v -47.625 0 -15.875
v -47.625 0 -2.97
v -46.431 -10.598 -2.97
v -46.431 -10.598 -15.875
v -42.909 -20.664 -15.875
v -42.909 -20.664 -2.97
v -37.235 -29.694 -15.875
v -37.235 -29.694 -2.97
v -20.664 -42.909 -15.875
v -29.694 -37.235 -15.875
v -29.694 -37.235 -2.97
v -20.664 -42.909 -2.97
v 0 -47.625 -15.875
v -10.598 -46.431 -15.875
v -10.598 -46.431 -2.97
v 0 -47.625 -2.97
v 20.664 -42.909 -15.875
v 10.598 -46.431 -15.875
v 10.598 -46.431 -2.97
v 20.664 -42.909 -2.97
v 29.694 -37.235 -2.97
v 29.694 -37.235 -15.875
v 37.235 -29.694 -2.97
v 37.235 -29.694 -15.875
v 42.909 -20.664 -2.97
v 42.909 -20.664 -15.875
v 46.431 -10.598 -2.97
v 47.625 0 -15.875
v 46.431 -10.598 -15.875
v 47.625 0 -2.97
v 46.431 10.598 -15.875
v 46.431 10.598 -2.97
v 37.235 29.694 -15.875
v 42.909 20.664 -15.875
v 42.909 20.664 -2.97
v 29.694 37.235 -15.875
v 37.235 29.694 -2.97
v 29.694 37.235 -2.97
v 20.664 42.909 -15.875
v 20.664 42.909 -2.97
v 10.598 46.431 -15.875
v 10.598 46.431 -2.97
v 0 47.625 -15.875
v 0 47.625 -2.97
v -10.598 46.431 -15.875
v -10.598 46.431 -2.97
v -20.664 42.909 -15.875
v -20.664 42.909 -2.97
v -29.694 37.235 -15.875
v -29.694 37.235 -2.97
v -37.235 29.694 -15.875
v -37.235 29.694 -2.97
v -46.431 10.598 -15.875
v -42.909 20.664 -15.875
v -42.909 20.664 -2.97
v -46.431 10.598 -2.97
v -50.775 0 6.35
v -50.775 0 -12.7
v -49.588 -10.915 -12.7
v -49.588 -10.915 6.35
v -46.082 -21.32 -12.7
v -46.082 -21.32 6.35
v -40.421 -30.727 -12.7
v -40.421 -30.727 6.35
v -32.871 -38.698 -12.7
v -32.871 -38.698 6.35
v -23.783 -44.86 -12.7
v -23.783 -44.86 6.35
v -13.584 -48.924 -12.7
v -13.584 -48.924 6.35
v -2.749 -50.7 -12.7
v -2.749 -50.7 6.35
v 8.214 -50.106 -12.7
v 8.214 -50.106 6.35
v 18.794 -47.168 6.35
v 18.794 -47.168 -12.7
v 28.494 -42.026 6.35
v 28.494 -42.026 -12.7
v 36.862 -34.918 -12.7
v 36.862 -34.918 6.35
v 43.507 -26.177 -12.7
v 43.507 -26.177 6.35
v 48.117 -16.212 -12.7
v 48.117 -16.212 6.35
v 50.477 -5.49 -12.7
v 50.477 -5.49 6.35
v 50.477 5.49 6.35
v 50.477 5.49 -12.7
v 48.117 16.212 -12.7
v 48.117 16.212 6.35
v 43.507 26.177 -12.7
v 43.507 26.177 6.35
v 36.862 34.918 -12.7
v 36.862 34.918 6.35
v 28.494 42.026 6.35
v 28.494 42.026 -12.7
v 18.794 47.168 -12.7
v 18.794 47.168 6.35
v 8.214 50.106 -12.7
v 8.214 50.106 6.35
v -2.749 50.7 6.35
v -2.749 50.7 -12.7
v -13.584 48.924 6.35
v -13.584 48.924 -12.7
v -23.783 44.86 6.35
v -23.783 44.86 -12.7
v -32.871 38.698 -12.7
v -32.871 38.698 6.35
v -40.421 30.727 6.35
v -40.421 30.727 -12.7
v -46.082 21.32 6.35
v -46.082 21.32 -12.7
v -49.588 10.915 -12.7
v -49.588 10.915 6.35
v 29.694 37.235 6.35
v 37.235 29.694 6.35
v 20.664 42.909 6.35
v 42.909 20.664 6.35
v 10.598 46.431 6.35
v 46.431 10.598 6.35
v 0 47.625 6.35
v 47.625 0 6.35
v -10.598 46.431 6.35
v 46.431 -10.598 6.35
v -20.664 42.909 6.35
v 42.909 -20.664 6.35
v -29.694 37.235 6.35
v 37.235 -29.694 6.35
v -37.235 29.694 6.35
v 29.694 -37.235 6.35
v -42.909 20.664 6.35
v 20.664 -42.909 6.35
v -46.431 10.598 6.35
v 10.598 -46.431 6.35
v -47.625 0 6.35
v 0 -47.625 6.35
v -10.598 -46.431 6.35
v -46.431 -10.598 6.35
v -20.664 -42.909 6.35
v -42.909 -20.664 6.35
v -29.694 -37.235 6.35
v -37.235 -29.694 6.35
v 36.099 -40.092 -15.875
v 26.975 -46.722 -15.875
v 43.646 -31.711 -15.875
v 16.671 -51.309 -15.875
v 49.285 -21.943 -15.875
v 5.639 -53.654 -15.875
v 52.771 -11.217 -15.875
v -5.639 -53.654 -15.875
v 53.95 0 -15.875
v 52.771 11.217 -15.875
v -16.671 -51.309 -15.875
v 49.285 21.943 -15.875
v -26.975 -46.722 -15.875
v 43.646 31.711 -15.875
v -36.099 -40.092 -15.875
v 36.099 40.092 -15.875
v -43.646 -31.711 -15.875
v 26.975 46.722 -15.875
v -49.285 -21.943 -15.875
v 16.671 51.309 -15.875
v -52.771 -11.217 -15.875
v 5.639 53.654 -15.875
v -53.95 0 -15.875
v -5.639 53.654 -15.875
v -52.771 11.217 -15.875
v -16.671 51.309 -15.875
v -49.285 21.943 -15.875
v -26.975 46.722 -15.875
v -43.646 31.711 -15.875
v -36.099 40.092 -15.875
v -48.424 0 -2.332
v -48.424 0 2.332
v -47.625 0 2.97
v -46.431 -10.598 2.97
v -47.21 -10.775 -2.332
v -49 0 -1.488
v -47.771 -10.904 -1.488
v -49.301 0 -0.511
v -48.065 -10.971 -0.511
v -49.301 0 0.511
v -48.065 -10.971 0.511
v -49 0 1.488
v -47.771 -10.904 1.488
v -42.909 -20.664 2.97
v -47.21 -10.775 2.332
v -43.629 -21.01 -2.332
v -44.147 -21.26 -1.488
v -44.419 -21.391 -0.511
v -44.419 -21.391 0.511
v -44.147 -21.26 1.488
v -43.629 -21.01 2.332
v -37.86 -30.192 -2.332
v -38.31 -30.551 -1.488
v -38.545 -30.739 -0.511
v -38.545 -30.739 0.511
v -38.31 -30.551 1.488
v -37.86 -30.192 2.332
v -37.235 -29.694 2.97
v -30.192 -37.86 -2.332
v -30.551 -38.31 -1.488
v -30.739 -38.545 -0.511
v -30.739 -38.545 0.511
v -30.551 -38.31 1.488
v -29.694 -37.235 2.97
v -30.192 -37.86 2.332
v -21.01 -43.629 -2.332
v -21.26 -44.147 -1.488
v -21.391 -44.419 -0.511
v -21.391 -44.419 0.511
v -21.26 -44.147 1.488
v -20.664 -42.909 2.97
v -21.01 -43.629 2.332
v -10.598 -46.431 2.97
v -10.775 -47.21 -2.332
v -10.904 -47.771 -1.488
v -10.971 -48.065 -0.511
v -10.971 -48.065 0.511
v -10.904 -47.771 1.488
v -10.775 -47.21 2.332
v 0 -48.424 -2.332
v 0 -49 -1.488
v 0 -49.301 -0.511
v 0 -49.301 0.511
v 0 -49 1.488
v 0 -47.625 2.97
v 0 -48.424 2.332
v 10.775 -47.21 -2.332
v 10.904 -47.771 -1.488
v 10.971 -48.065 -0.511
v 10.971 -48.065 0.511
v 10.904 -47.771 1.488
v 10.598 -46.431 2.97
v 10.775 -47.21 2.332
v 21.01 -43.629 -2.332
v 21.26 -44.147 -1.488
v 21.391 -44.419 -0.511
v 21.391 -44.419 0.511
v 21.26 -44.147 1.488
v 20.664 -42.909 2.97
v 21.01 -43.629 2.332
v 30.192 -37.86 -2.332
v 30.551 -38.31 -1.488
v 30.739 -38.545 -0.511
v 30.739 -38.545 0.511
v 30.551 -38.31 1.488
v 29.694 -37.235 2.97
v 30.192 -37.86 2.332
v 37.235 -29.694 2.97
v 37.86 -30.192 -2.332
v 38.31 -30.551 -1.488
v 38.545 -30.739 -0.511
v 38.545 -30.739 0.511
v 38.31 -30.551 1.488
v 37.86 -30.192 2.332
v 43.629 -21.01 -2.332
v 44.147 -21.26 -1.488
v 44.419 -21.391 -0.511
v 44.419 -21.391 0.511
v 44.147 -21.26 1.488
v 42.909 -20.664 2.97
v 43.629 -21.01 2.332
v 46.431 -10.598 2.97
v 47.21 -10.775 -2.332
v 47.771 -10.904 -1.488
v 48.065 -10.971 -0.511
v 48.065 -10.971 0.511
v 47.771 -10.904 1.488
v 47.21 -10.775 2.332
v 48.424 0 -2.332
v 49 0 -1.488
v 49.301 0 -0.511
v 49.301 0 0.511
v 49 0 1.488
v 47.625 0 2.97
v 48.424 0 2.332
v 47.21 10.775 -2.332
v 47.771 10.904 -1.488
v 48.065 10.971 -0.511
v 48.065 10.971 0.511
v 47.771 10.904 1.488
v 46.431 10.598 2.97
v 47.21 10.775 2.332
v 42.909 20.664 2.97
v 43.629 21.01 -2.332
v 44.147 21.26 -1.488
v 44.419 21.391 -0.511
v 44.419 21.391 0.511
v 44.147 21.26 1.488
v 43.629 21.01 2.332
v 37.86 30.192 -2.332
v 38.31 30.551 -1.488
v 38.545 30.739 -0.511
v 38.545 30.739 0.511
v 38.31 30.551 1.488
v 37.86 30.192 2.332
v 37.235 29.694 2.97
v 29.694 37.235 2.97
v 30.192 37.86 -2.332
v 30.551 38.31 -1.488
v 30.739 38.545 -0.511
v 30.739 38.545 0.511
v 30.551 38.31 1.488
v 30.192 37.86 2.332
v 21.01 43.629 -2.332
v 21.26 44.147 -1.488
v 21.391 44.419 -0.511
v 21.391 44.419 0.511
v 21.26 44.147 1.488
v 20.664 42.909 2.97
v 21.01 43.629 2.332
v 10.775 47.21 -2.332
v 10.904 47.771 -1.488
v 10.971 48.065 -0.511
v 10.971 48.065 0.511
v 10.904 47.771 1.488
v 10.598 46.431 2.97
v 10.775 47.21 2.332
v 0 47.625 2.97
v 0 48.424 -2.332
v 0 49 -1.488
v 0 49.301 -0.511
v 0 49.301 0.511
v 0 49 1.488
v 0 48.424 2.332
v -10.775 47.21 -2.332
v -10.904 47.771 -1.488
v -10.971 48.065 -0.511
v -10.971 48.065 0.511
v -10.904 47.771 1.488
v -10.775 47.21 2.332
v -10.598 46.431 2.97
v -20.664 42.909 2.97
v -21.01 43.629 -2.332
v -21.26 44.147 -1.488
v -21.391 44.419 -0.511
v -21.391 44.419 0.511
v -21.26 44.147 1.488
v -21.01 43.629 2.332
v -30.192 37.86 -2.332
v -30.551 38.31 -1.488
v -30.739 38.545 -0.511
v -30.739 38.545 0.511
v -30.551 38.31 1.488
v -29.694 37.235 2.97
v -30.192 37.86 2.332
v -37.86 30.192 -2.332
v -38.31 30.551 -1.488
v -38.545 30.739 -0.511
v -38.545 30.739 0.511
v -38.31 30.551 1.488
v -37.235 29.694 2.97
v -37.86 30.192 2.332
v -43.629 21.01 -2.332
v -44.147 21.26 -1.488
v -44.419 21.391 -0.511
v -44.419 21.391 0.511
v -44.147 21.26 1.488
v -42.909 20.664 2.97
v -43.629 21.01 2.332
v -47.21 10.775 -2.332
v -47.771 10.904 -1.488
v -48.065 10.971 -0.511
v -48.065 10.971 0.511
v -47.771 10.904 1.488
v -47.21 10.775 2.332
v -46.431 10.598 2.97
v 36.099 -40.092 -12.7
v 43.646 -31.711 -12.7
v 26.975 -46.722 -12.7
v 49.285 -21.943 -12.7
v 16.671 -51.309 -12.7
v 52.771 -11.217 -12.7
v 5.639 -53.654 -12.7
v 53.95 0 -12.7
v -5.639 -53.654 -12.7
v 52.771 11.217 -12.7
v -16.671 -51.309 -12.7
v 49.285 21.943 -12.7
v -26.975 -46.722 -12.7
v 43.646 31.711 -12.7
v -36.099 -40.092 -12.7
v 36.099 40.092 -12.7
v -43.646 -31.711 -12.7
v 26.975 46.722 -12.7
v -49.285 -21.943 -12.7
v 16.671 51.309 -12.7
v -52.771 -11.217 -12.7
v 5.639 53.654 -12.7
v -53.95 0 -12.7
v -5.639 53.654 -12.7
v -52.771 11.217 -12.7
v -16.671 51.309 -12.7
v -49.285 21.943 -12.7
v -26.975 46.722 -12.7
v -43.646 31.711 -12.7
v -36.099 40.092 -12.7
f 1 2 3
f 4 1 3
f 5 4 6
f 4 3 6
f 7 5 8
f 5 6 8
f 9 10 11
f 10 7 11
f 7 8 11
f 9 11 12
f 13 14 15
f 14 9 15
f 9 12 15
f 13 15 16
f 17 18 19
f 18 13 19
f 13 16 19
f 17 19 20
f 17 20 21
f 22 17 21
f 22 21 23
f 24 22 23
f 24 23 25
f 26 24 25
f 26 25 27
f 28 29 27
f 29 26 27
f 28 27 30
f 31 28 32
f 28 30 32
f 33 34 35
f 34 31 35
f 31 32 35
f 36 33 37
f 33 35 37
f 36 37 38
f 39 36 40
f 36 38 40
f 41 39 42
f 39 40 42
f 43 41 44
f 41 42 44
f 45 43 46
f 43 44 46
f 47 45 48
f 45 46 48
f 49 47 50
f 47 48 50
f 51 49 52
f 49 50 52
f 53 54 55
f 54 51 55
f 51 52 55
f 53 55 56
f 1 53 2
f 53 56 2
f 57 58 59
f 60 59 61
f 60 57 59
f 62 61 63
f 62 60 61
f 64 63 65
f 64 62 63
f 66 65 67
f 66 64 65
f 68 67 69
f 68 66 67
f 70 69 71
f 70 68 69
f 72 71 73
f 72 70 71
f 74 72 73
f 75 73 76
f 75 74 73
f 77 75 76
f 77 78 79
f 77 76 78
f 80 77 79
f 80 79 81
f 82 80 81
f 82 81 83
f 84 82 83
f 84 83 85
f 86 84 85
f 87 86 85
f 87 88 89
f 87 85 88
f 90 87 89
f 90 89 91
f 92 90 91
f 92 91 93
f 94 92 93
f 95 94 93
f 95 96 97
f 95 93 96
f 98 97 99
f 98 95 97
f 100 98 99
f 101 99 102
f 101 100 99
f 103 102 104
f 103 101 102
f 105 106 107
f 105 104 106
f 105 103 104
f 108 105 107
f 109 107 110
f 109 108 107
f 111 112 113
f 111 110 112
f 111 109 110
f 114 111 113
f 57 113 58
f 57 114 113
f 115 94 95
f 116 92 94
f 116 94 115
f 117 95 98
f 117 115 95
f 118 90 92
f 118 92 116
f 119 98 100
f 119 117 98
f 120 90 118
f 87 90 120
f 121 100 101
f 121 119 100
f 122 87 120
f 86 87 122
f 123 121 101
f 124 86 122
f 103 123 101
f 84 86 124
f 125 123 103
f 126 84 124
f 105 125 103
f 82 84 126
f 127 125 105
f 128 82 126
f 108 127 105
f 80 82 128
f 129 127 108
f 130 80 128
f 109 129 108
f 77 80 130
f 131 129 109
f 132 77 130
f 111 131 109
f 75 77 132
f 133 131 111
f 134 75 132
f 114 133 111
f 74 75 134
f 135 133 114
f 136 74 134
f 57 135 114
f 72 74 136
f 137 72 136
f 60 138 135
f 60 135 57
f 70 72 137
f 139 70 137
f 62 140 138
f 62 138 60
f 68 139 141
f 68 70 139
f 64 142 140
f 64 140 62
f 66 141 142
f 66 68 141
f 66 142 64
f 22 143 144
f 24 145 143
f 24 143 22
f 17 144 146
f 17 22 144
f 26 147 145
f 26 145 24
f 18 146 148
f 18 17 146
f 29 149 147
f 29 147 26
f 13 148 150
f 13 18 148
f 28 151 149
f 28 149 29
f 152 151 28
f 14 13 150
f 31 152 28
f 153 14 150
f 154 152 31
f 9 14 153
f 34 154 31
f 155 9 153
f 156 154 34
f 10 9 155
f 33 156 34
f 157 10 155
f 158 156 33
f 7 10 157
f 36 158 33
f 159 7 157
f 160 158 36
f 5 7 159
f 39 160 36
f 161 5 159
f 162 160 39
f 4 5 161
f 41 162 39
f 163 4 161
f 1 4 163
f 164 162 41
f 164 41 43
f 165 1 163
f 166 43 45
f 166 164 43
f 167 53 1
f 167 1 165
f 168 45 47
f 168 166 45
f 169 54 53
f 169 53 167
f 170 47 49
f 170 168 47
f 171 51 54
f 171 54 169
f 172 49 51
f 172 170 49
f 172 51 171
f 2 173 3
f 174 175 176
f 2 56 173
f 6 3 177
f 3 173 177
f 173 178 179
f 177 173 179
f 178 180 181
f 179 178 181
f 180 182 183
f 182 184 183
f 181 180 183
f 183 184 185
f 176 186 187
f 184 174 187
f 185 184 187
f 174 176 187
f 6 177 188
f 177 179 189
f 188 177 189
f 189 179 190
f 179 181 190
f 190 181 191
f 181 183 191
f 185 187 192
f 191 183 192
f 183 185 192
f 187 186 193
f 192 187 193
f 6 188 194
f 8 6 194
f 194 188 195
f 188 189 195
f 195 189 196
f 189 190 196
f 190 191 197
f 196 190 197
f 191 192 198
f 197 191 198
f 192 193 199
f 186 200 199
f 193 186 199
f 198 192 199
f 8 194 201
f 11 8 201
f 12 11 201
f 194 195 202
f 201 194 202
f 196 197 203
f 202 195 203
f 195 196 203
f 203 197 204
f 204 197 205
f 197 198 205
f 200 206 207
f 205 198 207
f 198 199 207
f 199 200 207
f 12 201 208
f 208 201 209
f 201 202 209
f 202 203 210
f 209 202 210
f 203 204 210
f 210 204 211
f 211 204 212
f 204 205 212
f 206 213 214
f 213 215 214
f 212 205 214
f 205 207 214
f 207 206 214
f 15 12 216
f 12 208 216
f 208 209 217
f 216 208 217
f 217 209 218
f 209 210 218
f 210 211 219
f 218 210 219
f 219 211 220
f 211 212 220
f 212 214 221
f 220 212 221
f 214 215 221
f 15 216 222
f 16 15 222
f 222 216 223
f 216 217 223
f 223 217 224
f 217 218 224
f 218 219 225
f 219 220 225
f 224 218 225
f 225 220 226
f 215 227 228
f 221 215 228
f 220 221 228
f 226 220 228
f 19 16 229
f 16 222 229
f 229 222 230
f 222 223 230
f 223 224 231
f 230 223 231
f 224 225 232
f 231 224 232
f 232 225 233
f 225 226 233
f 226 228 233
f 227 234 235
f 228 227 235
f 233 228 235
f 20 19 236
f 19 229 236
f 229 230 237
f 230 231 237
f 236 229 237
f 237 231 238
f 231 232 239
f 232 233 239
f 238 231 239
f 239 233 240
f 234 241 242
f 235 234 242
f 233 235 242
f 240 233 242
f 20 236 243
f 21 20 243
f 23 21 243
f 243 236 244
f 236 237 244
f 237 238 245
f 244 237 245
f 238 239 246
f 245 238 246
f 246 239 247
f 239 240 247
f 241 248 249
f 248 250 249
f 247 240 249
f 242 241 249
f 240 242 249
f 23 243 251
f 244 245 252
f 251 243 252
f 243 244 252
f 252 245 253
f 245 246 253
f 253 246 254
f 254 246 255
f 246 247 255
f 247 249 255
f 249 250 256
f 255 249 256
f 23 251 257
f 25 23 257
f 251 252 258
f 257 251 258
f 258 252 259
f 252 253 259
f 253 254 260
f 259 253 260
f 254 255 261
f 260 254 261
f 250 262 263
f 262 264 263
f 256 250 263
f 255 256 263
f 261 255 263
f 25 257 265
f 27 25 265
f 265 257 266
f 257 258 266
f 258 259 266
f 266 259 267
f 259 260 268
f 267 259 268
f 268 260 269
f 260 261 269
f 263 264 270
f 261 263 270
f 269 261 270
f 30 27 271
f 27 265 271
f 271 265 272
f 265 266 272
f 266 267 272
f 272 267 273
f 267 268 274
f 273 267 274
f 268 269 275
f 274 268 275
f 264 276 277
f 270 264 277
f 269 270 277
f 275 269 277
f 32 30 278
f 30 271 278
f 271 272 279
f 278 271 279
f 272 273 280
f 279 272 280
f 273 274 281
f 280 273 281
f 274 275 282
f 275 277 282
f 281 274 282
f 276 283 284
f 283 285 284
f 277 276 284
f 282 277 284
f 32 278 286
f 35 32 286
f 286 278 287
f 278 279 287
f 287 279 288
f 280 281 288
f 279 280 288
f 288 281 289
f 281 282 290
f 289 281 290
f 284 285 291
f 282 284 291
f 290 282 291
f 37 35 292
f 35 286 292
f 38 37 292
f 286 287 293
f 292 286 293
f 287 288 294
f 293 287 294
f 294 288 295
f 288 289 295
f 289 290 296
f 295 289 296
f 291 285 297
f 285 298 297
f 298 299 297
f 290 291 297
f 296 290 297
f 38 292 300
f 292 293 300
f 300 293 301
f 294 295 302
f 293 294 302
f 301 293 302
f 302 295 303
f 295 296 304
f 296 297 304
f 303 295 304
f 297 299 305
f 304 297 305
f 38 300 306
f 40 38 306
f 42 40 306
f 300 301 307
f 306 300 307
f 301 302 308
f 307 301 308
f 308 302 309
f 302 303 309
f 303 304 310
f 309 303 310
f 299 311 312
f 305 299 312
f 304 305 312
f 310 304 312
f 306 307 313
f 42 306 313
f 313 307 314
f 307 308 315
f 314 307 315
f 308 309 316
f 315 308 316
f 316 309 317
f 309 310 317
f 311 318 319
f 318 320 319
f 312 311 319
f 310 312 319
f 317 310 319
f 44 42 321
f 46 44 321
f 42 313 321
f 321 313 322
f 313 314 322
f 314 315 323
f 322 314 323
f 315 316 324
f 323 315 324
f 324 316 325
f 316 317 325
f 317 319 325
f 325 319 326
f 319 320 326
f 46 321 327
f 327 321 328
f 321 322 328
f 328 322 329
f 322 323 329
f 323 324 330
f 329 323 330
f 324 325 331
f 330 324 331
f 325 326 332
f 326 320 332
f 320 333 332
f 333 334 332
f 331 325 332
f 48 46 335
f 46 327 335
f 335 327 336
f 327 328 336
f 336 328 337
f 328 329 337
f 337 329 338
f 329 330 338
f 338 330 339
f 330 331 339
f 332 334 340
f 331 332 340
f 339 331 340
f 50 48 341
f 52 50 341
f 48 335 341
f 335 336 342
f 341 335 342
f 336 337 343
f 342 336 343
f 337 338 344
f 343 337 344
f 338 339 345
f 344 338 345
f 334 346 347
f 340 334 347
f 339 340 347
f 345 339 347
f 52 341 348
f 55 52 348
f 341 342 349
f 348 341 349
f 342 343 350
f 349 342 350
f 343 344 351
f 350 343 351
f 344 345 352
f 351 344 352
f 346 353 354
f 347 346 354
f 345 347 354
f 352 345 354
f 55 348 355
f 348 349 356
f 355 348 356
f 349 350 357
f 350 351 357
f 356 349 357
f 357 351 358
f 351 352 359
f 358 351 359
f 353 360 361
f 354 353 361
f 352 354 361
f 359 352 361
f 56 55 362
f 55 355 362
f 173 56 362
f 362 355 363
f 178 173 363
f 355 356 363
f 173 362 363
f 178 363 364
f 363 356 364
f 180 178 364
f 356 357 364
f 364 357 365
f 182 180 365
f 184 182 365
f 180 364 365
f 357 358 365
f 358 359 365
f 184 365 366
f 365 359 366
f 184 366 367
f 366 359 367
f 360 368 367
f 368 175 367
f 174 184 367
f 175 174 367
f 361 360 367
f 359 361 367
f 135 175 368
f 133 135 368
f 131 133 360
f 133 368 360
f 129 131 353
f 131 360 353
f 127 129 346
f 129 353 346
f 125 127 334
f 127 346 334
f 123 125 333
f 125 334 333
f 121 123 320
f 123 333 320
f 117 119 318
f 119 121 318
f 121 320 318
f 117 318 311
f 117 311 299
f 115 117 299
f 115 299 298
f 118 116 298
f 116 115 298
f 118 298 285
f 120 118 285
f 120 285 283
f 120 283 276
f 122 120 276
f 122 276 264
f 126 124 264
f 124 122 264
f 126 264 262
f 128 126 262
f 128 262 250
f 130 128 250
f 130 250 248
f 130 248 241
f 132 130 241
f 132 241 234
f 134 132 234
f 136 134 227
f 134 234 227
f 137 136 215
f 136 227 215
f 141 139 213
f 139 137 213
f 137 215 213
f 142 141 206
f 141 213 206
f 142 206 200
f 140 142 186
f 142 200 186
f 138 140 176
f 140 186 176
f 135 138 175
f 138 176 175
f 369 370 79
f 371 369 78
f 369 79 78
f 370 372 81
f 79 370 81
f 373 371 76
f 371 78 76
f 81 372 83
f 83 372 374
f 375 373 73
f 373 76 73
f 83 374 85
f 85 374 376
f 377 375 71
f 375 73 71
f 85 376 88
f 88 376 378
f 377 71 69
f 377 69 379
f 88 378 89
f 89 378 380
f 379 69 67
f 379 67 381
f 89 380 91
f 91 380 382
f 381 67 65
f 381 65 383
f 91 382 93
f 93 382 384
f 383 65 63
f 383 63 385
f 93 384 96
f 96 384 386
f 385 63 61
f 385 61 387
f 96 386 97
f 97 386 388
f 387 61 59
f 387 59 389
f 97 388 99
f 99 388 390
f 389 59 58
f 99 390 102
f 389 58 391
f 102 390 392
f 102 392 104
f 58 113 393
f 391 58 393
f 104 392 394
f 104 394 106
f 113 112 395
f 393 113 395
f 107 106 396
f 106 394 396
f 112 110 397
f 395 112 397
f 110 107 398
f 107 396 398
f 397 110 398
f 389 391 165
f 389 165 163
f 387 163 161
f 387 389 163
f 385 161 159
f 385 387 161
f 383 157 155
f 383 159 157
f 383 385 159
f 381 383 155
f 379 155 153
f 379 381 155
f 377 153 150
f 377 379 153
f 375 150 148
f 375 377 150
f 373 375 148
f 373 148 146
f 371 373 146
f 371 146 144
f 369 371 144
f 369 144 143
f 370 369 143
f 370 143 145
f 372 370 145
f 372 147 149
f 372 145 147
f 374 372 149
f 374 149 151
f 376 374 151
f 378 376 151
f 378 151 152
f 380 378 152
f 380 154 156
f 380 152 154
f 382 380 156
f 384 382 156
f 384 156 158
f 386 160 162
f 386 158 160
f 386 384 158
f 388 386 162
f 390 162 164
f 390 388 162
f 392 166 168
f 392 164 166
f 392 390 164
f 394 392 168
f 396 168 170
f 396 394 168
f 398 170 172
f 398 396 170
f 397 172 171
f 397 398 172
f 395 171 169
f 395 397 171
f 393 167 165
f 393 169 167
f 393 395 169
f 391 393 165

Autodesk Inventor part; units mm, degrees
ref_plane "YZ Plane" through (0, 0, 0) normal (1, 0, 0) x (0, 1, 0)
ref_plane "XZ Plane" through (0, 0, 0) normal (0, 1, 0) x (-1, 0, 0)
ref_plane "XY Plane" through (0, 0, 0) normal (0, 0, 1) x (1, 0, 0)
sketch "Sketch1" plane through (0, 0, 0) normal (0, 1, 0) x (-1, 0, 0)
  line L0 (50.7746, 6.35) -> (47.625, 6.35)
  line L1 (47.625, 6.35) -> (47.625, -6.35)
  line L2 (47.625, -6.35) -> (50.7746, -6.35)
  line L3 (50.7746, -6.35) -> (50.7746, 6.35)
  arc A0 (47.625, -2.9696) -> (47.625, 2.9696) centre (45.9105, 0) ccw
  line L4 (0, -8.89) -> (0, 8.89) projected
  point P0 (0, 0)
  point P1 (50.7746, 0)
  dimension "d1" = 47.625
  dimension "d2" = 3.1496
  dimension "d3" = 6.35
  dimension "d4" = 6.35
  dimension "d5" = 1.7145
  dimension "d6" = 3.429
revolve "Revolution1" add sketch "Sketch1" angle 360 about axis through (0, 0, -10) along (0, 0, 1) contours L3 L2 L1 A0 L0
sketch "Sketch2" plane through (0, 0, -6.35) normal (0, 0, -1) x (-1, 0, 0)
  circle A0 centre (0, 0) radius 50.7746 projected
  circle A1 centre (0, 0) radius 47.625 projected
  circle A2 centre (0, 0) radius 53.9496
  dimension "d8" = 3.175
extrude "Extrusion1" add sketch "Sketch2" along normal blind 6.35 contours A0
sketch "Sketch3" plane through (0, 0, -12.7) normal (0, 0, -1) x (-1, 0, 0)
  circle A0 centre (0, 0) radius 53.9496 projected
  circle A1 centre (0, 0) radius 47.625 projected
extrude "Extrusion2" add sketch "Sketch3" along normal blind 3.175
properties part number "outer ring end stop"
